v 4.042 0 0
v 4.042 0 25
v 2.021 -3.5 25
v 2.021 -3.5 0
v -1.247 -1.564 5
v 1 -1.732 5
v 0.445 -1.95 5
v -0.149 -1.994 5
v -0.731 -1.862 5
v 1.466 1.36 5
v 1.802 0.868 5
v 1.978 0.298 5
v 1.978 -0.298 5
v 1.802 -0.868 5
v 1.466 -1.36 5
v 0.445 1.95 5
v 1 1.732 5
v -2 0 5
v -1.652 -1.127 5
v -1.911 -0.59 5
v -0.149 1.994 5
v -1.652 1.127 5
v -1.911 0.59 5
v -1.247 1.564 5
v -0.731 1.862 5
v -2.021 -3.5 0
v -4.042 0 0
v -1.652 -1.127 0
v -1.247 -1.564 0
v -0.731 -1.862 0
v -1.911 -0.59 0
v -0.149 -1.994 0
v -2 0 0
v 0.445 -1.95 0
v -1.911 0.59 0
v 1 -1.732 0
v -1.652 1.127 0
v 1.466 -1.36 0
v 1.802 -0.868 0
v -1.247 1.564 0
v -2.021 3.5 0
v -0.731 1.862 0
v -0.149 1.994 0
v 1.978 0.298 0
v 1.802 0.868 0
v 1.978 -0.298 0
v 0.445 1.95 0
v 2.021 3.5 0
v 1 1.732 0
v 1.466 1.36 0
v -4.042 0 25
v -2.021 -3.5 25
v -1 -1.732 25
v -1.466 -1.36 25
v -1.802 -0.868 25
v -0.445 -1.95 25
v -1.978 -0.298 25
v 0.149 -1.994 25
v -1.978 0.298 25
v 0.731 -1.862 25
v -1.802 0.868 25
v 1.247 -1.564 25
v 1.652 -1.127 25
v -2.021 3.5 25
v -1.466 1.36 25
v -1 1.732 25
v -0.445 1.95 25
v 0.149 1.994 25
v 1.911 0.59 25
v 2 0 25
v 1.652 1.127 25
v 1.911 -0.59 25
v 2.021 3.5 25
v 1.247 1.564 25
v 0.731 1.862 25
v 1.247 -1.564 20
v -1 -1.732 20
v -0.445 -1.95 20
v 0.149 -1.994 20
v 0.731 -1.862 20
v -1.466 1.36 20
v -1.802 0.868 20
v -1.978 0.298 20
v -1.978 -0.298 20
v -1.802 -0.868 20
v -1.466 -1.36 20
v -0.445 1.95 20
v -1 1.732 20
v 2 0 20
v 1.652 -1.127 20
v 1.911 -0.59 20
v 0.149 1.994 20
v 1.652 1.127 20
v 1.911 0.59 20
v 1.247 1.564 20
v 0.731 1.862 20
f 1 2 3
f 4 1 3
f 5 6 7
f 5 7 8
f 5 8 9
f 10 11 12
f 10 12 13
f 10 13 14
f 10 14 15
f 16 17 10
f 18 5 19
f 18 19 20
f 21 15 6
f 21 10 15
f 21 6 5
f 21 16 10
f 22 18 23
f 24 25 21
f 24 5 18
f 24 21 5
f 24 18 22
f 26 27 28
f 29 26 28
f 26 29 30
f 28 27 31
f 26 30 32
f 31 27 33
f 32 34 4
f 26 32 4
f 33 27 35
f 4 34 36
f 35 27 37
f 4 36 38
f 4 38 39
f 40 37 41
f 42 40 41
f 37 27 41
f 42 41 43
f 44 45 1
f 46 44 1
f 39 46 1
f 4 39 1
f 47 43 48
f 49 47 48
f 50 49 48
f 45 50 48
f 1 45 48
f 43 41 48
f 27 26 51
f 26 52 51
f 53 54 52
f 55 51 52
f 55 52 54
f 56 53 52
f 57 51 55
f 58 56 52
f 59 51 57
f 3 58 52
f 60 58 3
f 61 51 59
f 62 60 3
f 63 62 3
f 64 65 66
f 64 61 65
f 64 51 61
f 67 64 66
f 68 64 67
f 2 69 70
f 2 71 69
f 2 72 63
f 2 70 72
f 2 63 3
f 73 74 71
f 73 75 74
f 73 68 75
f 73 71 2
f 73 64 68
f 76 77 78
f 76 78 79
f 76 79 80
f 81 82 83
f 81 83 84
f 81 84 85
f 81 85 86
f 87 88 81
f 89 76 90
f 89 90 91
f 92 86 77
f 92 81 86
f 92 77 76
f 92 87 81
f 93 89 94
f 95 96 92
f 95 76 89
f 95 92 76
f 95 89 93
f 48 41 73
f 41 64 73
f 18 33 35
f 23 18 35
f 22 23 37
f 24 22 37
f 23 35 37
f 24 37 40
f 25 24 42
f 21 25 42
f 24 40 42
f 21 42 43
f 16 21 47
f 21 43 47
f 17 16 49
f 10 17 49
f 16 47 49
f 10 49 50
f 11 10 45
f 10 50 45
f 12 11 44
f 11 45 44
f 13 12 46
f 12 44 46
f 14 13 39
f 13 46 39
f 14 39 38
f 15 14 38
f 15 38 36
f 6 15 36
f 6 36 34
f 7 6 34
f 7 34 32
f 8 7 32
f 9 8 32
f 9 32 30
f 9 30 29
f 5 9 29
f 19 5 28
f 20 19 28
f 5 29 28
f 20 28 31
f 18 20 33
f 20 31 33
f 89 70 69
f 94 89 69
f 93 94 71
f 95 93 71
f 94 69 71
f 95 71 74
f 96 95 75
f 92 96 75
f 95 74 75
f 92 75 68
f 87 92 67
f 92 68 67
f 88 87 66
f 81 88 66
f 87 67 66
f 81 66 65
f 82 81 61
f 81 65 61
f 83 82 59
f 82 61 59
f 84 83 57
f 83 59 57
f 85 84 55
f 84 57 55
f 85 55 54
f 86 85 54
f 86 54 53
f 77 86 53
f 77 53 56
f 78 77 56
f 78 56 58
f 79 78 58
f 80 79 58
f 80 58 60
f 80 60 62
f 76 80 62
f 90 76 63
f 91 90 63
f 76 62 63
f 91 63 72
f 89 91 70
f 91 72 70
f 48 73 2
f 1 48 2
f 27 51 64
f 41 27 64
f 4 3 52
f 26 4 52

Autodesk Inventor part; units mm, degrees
ref_plane "YZ Plane" through (0, 0, 0) normal (1, 0, 0) x (0, 1, 0)
ref_plane "XZ Plane" through (0, 0, 0) normal (0, 1, 0) x (-1, 0, 0)
ref_plane "XY Plane" through (0, 0, 0) normal (0, 0, 1) x (1, 0, 0)
sketch "Sketch1" plane through (0, 0, 0) normal (0, 0, 1) x (1, 0, 0)
  circle A0 centre (0, 0) radius 4.5
  dimension "d0" = 9
extrude "Extrusion1" add sketch "Sketch1" along normal blind 25
sketch "Sketch2" plane through (0, 0, 25) normal (0, 0, 1) x (1, 0, 0)
  circle A0 centre (0, 0) radius 2
  dimension "d3" = 4
extrude "Extrusion2" cut sketch "Sketch2" against normal blind 5
sketch "Sketch3" plane through (0, 0, 0) normal (0, 0, -1) x (-1, 0, 0)
  circle A0 centre (0, 0) radius 2
  dimension "d6" = 4
extrude "Extrusion3" cut sketch "Sketch3" against normal blind 5
sketch "Sketch4" plane through (0, 0, 25) normal (0, 0, 1) x (1, 0, 0)
  line L0 (2.0207, 3.5) -> (4.0415, 0)
  line L1 (4.0415, 0) -> (2.0207, -3.5)
  line L2 (2.0207, -3.5) -> (-2.0207, -3.5)
  line L3 (-2.0207, -3.5) -> (-4.0415, 0)
  line L4 (-4.0415, 0) -> (-2.0207, 3.5)
  line L5 (-2.0207, 3.5) -> (2.0207, 3.5)
  circle A0 centre (0, 0) radius 4.5 projected
  dimension "d9" = 7
extrude "Extrusion4" cut sketch "Sketch4" against normal up to surface (25 mm away)
properties part number "CapacitorBankStandoff"
